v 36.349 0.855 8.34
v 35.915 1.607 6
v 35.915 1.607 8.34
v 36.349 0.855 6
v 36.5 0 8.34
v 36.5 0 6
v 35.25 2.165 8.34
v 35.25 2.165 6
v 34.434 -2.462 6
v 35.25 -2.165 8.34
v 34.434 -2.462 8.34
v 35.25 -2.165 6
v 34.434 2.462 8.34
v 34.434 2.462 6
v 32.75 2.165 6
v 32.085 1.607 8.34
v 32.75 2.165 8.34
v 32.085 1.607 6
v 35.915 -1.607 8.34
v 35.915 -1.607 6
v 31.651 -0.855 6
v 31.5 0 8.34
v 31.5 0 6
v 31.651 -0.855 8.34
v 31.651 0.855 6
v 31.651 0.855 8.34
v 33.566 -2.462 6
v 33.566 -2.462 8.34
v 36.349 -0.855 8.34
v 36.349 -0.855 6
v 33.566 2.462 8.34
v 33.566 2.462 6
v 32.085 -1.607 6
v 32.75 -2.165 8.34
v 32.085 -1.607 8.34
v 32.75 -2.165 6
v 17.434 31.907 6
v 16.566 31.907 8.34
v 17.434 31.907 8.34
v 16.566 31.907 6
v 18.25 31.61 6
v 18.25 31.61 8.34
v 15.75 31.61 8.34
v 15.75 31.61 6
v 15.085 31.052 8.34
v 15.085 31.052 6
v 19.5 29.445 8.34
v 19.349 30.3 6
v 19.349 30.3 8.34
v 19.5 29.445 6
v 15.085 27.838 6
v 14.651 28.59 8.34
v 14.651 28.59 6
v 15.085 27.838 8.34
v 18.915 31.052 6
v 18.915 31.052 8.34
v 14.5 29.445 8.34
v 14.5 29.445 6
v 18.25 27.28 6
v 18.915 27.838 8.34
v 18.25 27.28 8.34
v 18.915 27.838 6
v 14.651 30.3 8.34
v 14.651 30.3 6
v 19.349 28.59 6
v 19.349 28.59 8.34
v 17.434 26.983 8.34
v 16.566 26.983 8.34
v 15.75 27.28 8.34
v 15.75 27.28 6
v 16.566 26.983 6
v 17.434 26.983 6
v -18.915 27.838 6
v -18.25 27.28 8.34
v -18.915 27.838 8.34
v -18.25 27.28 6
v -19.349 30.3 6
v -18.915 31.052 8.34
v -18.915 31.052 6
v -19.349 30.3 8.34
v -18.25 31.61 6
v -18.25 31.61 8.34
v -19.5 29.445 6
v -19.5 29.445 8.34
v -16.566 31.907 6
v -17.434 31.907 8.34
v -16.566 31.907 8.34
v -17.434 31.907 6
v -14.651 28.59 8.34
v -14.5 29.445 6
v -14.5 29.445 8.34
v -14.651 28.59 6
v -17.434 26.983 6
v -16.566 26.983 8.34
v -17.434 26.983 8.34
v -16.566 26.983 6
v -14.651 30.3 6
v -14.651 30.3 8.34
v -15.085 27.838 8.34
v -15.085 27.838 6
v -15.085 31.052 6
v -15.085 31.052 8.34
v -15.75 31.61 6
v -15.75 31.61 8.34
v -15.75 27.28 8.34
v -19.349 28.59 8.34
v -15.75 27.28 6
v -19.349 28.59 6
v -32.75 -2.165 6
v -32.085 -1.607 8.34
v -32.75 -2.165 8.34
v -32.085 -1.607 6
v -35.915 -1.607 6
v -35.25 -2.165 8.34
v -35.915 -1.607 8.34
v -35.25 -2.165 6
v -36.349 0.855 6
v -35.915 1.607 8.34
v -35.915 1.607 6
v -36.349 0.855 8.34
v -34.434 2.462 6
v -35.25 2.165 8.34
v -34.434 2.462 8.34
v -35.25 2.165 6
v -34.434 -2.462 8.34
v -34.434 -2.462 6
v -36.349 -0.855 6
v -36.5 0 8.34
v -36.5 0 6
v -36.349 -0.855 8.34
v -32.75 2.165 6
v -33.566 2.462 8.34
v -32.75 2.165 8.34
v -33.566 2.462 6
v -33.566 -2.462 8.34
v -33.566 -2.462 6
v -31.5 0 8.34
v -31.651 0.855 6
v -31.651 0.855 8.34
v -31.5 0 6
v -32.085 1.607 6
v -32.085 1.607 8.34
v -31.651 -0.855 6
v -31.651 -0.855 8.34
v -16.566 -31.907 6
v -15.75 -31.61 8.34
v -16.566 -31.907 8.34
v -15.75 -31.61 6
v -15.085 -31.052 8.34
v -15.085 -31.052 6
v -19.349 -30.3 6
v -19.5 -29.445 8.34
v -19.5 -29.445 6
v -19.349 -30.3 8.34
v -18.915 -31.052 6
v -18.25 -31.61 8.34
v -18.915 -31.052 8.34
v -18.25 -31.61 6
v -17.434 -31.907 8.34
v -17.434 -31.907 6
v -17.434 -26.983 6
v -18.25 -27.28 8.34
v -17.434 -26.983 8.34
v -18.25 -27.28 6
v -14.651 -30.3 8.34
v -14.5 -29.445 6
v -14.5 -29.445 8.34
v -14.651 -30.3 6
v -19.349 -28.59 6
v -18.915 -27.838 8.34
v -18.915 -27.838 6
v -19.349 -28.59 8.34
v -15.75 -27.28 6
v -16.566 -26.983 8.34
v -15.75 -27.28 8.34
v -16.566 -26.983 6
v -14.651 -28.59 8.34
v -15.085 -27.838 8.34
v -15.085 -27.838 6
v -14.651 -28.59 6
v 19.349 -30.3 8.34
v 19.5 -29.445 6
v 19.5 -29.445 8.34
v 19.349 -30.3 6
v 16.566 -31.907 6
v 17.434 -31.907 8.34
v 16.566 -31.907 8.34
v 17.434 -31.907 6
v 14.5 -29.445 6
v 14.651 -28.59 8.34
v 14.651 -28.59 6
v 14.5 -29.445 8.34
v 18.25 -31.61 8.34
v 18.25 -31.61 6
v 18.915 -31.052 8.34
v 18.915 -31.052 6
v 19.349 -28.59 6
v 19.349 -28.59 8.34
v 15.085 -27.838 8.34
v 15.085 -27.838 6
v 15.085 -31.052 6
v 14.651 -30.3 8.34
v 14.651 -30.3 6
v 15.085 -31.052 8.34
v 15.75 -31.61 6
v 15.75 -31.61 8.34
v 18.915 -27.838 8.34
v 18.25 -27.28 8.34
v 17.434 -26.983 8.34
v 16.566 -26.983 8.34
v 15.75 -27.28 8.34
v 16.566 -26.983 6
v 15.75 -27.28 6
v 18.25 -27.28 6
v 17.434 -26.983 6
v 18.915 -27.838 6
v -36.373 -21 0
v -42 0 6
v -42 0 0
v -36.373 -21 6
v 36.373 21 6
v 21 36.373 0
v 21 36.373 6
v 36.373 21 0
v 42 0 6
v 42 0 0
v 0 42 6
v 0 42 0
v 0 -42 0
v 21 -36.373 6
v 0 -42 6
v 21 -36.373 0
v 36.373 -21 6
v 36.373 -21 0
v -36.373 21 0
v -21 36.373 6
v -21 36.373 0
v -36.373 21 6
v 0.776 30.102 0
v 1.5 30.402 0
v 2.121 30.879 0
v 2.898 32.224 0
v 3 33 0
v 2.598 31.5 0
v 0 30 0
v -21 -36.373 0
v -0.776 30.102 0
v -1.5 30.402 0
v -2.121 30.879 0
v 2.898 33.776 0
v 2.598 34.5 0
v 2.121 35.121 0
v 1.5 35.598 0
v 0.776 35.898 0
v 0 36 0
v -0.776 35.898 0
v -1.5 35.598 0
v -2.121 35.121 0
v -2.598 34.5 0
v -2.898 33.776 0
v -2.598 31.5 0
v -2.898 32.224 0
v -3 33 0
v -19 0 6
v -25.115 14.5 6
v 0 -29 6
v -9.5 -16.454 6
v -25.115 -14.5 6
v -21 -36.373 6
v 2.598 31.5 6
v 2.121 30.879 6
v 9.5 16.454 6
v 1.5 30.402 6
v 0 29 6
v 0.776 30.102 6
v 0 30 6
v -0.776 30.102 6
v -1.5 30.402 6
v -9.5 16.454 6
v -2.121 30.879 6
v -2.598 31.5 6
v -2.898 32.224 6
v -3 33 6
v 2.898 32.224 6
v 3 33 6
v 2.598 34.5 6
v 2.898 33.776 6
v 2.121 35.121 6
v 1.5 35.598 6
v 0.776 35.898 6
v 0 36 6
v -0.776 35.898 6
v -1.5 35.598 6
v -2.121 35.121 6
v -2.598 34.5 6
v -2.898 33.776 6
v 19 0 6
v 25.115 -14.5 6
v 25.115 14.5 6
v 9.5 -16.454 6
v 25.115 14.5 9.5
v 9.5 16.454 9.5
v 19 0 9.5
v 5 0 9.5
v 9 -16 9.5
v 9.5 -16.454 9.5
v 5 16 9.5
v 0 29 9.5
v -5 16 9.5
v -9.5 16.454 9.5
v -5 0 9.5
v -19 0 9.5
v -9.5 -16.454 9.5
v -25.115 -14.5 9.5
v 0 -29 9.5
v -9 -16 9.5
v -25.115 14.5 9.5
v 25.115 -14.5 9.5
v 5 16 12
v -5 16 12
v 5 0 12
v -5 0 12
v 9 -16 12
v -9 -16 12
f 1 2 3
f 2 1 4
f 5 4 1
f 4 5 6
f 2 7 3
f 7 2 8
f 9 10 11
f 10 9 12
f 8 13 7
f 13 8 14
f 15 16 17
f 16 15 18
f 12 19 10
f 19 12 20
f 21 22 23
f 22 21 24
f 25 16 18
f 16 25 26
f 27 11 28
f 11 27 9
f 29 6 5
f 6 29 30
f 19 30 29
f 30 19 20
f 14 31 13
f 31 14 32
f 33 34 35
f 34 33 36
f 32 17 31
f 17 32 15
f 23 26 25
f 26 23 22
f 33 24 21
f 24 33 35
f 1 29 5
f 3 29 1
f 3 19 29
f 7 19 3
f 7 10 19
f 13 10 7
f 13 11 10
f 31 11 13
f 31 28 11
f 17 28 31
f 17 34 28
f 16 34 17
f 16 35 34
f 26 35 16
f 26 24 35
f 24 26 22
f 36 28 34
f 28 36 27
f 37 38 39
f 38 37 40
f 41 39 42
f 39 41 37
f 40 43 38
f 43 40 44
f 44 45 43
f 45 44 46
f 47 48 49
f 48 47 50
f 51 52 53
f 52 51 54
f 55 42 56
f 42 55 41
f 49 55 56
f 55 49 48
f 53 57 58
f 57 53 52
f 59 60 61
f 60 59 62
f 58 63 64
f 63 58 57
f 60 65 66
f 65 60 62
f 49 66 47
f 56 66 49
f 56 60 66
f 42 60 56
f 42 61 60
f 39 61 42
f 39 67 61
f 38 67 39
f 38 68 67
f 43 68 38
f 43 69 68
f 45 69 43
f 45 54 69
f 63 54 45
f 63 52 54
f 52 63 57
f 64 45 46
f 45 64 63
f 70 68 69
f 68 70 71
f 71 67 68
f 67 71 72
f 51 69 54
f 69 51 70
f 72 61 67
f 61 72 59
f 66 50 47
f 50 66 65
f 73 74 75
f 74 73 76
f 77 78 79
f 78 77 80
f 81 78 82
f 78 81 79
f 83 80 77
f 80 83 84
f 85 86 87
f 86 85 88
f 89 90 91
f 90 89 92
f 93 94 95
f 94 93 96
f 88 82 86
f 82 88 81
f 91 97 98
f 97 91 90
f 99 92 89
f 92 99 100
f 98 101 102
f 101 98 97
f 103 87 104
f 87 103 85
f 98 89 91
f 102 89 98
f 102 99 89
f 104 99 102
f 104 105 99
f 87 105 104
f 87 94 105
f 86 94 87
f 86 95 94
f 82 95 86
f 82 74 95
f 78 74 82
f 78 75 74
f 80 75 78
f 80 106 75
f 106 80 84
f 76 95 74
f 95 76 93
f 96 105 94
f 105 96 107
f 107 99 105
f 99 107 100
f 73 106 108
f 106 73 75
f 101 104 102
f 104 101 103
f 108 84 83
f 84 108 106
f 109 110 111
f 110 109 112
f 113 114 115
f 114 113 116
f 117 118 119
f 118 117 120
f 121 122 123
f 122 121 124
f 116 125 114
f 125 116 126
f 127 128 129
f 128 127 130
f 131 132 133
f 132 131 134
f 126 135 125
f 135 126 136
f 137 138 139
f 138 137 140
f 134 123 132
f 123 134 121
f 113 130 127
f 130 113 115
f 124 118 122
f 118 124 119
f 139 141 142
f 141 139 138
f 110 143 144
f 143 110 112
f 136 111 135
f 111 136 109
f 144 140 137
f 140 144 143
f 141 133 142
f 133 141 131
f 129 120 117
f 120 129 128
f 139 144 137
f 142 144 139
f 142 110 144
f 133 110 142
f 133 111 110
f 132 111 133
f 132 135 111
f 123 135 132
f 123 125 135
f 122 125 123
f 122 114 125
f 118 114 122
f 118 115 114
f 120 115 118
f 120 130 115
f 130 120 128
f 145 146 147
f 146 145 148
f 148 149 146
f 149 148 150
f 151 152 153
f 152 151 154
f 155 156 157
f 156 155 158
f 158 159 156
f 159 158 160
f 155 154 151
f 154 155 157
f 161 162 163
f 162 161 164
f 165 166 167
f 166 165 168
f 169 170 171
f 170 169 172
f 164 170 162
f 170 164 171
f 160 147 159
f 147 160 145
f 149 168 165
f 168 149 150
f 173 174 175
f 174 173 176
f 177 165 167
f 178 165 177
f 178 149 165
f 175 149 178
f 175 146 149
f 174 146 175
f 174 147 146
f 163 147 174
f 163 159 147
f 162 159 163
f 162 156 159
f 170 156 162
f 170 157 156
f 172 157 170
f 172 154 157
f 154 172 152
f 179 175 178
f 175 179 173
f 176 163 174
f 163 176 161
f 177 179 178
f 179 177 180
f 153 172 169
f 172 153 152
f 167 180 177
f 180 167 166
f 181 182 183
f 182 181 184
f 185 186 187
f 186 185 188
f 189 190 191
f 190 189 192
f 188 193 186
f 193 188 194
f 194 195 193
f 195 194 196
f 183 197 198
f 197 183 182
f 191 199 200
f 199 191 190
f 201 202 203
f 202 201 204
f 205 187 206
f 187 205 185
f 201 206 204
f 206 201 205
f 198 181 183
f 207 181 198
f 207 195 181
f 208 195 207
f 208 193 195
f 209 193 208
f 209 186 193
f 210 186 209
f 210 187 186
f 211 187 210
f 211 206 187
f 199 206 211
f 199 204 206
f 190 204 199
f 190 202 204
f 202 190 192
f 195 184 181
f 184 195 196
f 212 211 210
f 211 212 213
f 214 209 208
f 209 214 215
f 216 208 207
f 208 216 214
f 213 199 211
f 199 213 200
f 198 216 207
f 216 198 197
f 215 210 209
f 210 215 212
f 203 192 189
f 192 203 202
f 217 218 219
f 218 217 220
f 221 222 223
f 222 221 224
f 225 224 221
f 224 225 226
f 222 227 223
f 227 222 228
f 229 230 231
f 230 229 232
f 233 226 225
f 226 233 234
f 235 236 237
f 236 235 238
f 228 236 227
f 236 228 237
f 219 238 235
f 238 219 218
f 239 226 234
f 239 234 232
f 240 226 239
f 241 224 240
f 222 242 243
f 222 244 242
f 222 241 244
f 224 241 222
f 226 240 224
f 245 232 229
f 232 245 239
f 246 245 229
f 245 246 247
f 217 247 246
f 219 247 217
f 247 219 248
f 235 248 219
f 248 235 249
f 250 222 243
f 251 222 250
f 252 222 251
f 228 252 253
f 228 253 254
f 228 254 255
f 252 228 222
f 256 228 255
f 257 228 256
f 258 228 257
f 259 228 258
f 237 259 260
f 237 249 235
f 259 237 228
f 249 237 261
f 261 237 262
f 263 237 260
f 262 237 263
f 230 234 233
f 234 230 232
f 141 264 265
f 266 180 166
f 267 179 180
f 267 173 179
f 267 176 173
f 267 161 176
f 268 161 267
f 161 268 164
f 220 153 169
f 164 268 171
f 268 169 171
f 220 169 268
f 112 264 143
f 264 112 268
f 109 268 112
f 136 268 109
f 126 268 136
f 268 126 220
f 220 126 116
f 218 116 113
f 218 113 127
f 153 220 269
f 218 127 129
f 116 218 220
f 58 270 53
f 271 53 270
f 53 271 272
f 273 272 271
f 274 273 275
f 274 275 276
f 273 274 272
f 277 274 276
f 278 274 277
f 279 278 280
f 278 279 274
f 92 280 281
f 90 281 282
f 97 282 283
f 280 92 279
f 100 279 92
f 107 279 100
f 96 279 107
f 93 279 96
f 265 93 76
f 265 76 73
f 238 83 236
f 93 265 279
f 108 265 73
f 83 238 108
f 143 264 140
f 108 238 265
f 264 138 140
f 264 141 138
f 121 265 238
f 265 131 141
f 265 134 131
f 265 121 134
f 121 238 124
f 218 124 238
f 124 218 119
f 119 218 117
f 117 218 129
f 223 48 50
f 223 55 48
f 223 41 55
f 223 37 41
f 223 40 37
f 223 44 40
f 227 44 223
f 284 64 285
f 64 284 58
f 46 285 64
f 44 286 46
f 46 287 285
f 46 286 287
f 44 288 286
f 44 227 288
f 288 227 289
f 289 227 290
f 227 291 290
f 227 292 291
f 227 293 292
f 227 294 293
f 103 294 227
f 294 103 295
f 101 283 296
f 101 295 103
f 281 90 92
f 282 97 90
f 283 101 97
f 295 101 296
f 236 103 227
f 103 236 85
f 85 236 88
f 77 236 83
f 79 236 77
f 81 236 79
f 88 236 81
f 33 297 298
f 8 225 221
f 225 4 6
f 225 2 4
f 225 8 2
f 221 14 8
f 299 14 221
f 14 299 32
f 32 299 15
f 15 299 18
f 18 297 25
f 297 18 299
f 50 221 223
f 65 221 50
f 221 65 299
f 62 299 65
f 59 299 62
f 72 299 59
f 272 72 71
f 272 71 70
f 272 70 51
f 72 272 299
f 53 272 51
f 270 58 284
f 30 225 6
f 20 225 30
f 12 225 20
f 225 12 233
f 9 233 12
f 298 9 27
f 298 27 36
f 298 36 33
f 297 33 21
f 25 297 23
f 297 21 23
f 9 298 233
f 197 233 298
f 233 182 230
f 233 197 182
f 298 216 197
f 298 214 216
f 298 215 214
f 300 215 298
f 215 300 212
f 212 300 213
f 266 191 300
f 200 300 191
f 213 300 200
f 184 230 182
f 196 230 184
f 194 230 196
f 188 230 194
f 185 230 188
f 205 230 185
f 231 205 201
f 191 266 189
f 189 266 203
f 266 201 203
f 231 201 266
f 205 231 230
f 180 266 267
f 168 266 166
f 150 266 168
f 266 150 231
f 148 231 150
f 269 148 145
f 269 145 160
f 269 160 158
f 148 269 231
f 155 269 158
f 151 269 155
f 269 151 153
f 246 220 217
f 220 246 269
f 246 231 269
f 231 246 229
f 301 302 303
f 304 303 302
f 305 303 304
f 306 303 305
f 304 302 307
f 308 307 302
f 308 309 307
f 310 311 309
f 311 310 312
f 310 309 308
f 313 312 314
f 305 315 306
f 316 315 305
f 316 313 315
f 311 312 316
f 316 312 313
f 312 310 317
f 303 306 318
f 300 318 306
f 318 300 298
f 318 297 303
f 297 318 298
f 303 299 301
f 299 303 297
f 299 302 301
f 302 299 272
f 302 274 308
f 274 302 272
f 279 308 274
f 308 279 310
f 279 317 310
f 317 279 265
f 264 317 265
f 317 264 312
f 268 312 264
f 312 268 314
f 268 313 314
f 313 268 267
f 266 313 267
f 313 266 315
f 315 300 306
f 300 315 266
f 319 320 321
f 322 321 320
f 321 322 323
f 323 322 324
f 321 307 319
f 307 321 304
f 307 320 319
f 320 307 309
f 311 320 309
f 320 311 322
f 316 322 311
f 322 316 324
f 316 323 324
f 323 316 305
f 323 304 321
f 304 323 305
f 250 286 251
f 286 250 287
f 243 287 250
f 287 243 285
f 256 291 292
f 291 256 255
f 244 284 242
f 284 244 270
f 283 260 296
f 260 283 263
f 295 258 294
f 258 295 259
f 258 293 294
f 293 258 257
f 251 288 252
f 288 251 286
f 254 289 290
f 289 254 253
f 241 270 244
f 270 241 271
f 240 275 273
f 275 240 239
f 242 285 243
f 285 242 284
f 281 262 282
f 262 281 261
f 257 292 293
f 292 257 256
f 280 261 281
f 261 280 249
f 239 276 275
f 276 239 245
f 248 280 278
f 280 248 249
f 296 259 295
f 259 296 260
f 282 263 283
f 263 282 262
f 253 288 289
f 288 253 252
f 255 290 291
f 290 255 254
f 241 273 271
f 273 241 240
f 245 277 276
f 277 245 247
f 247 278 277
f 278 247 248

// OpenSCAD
// SPDX-License-Identifier: MIT
// Alchemist Costume Brooch | 3D Worlds overseas batch 02 | original, unverified CAD.
// Millimeters; Z-up; fixed published envelope W x D x H = 84 x 84 x 12.
// Retain previous v1.3 family/variant metadata for compatible exporter validation.
use <lib/commerce_forms.scad>
use <lib/refined_batch02_forms.scad>
w = 84; d = 84; h = 12;
// Edit label below where applicable. Do not assume lettering / openings fit every input.
label = "CUSTOM";
refined_batch02_form(slug="alchemist-costume-brooch",family="cosplay",variant=4,w=w,d=d,h=h,label=label);
